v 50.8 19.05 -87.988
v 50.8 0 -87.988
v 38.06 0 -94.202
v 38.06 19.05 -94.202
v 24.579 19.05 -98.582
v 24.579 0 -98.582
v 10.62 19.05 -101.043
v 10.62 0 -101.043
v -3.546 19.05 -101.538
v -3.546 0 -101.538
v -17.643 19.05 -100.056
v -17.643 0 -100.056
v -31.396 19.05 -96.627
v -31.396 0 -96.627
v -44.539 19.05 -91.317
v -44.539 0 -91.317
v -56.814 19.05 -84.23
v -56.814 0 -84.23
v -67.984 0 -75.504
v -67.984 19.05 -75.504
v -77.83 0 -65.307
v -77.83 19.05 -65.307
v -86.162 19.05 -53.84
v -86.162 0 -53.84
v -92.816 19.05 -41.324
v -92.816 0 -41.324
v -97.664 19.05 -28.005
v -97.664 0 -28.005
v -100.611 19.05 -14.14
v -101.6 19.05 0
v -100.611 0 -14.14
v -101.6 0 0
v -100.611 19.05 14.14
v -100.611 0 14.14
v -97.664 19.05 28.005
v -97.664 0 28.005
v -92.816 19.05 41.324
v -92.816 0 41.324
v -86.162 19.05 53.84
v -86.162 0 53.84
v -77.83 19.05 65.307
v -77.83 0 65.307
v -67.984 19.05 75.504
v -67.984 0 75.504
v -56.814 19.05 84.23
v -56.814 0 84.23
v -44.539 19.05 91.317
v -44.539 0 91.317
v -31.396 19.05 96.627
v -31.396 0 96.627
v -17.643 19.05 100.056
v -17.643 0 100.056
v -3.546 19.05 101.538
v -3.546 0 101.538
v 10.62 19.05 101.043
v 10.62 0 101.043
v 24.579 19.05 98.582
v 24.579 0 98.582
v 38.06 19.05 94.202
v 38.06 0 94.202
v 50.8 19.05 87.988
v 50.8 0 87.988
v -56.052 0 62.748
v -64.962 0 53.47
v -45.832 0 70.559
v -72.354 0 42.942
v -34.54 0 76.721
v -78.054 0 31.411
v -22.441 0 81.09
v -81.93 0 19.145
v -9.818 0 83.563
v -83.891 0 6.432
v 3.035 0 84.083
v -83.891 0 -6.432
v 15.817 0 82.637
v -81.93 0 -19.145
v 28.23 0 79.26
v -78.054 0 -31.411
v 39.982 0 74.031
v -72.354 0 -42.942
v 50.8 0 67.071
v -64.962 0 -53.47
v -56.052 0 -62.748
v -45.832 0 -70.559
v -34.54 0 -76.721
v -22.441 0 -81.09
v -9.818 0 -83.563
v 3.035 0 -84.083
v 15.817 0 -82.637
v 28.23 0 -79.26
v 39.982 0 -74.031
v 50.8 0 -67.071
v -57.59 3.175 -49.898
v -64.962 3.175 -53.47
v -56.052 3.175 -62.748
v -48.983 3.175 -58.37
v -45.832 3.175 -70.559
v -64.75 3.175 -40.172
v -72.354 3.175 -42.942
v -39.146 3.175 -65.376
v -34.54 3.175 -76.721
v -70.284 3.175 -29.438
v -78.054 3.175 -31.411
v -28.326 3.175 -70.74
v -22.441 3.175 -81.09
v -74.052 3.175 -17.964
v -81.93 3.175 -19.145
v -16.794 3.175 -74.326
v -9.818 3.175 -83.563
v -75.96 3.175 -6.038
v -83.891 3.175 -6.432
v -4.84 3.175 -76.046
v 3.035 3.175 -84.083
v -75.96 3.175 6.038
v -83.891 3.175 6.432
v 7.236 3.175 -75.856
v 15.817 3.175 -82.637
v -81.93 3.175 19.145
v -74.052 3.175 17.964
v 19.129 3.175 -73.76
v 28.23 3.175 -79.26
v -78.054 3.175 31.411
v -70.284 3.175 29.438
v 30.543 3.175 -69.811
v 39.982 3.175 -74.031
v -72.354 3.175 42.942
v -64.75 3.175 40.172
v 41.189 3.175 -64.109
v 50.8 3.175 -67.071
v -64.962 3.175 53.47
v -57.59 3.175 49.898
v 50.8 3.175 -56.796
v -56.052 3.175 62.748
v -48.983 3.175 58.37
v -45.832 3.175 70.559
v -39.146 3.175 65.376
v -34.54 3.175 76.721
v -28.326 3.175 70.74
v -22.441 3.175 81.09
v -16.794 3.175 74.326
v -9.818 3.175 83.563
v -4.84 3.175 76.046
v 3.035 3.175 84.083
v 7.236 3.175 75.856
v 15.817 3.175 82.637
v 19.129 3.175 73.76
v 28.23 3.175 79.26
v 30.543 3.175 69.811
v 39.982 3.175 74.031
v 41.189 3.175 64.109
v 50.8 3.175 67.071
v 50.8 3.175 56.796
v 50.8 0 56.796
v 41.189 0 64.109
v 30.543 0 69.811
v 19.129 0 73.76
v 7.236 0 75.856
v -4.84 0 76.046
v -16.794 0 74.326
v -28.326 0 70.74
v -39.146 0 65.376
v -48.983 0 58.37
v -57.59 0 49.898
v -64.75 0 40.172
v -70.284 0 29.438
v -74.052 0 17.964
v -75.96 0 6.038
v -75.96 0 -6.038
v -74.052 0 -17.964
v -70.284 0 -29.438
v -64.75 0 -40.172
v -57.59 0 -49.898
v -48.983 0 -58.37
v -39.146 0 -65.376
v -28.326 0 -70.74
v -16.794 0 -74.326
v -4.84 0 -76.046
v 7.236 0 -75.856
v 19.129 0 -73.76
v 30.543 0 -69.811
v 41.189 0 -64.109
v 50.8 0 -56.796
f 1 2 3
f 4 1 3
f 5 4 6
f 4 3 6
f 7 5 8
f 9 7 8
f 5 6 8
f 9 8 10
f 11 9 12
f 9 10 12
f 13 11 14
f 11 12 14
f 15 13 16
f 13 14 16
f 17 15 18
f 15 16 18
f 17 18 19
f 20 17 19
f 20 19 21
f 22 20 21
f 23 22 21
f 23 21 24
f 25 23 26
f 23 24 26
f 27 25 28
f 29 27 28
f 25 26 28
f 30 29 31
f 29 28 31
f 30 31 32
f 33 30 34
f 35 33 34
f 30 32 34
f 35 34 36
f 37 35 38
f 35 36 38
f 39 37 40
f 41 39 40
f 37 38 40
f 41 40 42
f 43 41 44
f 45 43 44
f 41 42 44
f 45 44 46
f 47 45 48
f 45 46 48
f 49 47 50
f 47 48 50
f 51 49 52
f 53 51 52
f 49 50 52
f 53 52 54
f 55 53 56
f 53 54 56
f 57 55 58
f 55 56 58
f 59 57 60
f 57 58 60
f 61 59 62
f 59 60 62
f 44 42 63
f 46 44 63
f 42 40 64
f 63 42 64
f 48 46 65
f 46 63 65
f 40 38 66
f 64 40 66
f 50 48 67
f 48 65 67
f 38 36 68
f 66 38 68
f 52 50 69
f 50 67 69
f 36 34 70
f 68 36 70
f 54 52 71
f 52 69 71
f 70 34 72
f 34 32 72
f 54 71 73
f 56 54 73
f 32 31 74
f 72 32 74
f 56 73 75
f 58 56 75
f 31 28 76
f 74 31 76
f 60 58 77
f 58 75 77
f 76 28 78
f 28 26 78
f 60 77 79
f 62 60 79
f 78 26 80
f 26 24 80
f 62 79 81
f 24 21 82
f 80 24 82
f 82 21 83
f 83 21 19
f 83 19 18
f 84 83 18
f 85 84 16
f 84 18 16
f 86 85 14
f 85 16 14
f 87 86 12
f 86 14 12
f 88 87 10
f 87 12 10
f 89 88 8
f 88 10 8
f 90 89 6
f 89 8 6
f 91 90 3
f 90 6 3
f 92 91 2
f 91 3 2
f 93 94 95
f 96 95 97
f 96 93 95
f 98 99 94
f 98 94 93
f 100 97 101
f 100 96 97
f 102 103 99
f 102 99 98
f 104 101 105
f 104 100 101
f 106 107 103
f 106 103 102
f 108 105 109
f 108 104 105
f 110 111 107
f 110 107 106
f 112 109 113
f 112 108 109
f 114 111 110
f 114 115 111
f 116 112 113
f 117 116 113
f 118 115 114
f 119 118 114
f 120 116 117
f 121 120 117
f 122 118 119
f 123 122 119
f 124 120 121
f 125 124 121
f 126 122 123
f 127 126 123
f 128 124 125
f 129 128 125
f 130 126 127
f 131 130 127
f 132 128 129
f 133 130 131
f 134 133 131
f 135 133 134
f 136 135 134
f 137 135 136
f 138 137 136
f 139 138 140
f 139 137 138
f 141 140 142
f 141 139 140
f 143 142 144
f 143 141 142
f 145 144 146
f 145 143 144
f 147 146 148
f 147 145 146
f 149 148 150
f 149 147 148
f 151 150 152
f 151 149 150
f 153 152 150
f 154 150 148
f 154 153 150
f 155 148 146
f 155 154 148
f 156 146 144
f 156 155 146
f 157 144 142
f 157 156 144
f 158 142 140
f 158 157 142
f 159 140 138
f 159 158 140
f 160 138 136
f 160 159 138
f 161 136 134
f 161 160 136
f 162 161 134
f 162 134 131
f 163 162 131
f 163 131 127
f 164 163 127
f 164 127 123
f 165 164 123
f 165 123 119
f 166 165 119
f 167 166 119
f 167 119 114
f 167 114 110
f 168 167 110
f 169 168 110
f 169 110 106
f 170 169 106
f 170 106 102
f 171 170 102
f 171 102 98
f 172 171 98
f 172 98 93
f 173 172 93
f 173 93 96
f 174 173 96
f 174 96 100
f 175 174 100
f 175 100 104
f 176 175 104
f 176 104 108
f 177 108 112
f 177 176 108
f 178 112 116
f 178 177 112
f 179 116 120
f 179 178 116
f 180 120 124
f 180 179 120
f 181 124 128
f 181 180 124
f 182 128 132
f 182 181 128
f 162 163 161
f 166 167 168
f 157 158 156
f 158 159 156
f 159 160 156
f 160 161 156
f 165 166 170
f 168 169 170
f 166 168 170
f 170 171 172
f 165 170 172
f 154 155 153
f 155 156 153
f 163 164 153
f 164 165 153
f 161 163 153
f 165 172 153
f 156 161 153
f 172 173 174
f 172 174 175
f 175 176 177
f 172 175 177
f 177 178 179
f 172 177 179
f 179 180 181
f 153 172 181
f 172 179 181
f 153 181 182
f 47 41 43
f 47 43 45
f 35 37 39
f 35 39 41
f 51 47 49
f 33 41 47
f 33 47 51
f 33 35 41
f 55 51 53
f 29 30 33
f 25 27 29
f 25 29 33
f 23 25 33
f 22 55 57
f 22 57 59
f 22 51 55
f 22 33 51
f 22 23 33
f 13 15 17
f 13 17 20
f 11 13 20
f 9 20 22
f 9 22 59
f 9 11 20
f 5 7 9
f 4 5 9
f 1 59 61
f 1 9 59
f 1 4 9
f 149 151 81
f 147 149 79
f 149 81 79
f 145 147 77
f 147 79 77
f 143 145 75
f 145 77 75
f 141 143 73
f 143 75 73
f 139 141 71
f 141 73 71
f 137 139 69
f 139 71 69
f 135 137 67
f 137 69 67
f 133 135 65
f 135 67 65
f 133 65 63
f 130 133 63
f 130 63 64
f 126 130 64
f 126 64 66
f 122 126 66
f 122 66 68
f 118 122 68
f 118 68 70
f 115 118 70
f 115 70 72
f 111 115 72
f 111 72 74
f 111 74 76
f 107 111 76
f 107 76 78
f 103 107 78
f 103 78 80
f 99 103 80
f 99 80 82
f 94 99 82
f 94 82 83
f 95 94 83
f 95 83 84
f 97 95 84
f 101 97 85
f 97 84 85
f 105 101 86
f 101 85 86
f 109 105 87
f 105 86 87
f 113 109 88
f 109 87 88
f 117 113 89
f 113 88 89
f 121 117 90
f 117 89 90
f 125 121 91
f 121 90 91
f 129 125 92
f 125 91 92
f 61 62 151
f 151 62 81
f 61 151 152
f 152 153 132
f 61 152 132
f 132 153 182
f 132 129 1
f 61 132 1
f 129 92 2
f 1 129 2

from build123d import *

# Parameters (mm, degrees)
BOSS_EXTRUDE1_DEPTH = 19.05
SKETCH2_R           = 84.1375
SKETCH2_R_2         = 76.2
CUT_EXTRUDE1_DEPTH  = 3.175


with BuildPart() as part:
    # Sketch1 → Boss-Extrude1 (new body)
    with BuildSketch(Plane(origin=(0, 0, 0), x_dir=(1, 0, 0), z_dir=(0, 1, 0))):
        with BuildLine():
            Line((50.8, -87.988181024), (50.8, 87.988181024))
            ThreePointArc((50.8, 87.988181024), (-101.6, 0), (50.8, -87.988181024))
        make_face()
    extrude(amount=BOSS_EXTRUDE1_DEPTH)

    # Sketch2 → Cut-Extrude1 (cut)
    with BuildSketch(Plane.XZ):
        Circle(SKETCH2_R)
        Circle(SKETCH2_R_2, mode=Mode.SUBTRACT)
    extrude(amount=-CUT_EXTRUDE1_DEPTH, mode=Mode.SUBTRACT)


solid = part.part
